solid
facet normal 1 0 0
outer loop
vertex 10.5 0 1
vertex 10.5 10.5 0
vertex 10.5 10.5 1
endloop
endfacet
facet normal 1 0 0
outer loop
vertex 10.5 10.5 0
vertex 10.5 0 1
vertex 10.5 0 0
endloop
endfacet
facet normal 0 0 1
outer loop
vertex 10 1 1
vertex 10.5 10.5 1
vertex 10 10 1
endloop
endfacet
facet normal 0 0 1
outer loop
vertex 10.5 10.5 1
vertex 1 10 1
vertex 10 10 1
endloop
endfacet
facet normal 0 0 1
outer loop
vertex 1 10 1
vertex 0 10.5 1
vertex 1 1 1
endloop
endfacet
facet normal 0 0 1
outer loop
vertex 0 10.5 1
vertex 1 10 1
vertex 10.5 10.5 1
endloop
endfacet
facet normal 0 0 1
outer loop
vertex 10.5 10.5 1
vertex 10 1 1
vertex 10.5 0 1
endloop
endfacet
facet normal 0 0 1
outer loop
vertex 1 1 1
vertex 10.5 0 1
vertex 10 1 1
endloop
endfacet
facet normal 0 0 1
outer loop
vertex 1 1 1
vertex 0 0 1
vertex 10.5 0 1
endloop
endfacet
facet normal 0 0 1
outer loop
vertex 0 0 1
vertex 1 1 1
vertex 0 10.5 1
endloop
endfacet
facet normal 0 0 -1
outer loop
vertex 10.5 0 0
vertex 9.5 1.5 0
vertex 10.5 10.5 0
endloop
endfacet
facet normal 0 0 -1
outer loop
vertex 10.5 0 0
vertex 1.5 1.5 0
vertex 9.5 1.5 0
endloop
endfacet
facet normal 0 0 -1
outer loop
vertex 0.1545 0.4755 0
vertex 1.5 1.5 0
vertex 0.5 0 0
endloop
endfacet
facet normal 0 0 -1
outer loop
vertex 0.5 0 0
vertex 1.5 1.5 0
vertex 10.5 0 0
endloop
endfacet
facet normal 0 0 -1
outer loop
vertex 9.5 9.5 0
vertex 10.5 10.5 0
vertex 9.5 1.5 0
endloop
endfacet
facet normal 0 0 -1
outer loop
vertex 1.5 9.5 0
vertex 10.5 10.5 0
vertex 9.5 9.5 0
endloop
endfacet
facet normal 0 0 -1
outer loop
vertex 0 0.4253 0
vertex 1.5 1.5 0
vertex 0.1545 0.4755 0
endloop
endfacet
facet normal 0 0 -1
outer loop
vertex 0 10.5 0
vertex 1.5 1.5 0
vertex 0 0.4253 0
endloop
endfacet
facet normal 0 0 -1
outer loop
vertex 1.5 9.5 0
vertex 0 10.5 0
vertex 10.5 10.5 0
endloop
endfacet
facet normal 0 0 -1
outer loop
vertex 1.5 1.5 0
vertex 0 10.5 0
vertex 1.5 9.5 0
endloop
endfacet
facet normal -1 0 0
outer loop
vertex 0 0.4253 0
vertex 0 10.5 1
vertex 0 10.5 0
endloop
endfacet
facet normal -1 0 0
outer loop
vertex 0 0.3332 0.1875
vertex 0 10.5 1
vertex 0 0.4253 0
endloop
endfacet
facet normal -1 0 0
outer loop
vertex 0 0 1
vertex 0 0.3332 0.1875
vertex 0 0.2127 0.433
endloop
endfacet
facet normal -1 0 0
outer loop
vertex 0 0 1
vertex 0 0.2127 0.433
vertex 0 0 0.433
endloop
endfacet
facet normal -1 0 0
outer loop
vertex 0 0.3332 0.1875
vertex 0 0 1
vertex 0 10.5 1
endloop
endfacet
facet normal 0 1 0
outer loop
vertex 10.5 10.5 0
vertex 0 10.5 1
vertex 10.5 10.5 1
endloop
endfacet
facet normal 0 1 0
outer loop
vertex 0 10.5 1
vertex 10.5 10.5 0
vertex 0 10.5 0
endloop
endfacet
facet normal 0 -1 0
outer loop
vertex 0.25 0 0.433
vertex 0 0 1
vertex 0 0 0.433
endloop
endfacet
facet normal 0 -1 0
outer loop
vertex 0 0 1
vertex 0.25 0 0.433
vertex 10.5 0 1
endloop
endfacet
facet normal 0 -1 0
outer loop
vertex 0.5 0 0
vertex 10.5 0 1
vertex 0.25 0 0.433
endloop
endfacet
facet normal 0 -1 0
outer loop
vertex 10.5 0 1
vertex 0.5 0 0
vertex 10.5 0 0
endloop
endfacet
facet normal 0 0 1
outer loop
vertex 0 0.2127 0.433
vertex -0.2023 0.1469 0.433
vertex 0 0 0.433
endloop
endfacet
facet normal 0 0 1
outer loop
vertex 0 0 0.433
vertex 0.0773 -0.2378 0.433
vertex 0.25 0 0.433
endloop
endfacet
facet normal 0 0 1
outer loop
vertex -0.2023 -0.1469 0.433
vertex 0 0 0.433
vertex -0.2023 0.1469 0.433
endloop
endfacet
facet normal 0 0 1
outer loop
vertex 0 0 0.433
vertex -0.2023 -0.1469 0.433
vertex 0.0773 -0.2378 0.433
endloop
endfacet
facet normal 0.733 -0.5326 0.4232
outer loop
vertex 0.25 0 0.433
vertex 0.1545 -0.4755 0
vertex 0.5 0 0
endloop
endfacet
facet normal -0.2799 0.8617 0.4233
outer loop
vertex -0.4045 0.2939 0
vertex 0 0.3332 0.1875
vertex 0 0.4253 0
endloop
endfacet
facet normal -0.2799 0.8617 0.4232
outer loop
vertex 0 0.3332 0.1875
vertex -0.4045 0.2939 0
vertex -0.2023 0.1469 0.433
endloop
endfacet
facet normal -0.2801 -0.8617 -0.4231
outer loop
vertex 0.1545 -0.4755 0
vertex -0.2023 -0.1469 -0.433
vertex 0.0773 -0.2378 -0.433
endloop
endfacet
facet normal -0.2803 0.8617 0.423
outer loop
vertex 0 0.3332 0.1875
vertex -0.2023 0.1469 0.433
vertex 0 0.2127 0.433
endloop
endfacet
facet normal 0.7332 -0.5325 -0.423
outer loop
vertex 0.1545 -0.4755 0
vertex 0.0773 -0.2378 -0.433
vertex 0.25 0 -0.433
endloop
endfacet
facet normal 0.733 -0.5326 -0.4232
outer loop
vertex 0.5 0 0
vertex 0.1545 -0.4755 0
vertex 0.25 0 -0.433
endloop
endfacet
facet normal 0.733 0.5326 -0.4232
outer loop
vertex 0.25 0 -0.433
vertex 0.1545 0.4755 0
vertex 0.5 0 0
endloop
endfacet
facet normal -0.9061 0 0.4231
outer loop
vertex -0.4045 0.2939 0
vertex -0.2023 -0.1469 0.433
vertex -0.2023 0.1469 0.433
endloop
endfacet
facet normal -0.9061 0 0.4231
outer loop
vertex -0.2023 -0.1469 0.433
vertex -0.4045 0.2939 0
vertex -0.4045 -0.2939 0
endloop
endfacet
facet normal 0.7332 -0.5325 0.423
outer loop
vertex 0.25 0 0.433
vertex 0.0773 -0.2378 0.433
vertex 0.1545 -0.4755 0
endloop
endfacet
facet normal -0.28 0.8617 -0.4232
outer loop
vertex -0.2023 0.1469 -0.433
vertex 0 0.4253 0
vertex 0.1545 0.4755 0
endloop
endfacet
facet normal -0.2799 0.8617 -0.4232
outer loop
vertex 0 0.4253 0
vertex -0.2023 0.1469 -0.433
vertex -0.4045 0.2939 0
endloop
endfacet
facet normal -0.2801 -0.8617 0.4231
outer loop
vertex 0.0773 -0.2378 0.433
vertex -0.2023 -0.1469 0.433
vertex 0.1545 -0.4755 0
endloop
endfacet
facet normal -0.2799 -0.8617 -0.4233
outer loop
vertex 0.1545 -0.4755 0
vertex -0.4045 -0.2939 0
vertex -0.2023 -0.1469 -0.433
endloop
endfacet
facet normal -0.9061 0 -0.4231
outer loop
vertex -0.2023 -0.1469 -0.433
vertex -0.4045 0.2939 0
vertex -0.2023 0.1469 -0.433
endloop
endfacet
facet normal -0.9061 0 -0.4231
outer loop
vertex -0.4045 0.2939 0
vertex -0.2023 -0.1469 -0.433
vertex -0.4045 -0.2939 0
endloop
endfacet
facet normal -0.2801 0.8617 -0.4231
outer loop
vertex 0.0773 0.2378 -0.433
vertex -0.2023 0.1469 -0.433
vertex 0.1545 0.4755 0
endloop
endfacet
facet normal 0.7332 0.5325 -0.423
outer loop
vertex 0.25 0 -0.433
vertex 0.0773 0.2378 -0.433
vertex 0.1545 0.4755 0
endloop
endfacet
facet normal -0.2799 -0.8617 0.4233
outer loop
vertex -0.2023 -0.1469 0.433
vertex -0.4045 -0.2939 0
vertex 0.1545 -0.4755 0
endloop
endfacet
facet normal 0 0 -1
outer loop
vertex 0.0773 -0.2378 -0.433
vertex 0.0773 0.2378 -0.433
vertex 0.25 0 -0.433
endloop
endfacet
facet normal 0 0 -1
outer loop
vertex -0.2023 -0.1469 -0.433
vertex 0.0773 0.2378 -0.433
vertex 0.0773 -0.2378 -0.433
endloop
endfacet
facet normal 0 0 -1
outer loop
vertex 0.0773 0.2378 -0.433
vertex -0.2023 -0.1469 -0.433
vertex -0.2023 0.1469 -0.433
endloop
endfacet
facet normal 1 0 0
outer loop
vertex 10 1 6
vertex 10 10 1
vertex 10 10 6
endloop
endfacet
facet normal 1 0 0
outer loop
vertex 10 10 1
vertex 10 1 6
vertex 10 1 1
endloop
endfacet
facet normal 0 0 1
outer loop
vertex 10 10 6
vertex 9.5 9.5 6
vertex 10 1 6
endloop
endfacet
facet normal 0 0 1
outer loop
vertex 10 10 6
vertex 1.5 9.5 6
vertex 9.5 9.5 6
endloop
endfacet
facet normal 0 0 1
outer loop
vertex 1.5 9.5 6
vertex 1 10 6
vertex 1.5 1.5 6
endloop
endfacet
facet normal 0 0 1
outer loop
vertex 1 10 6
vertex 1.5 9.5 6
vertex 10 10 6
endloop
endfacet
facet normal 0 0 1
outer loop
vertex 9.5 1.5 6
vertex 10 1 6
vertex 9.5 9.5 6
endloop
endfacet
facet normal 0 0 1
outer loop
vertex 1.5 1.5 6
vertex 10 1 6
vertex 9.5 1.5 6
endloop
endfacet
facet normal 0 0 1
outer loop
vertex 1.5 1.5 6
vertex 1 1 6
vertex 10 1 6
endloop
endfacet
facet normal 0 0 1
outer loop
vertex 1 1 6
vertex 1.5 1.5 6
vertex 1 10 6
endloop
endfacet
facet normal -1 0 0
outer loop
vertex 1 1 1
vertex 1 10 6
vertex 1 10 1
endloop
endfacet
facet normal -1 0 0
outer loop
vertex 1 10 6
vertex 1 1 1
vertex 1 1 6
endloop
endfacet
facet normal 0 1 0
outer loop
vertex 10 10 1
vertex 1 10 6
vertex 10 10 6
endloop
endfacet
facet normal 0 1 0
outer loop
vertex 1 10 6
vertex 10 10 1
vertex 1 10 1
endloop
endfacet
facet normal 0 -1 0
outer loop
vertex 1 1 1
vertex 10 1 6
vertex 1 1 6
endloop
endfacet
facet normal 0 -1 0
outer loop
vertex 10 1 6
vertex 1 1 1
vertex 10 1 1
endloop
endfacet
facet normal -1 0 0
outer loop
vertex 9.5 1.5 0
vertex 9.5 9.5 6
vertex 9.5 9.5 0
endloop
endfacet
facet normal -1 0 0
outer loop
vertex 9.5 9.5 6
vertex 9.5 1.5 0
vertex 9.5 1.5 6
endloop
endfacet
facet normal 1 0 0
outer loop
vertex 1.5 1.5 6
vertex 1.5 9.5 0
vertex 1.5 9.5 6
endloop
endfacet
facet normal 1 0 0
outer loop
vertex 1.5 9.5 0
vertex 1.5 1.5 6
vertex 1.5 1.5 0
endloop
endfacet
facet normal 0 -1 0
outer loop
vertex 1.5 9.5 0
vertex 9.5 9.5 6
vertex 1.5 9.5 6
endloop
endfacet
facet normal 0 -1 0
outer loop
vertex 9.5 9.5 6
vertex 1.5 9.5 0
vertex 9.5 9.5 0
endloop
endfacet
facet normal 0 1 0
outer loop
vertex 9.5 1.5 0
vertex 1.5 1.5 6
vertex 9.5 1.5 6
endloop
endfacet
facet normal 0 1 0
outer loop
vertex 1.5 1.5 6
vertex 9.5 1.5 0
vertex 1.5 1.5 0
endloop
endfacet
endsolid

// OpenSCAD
// file: multiprint.scad
//----------------------------------------------------------------------
// multiprint.scad -- make it easy to print one or several of an item
//
// For your reference, it seems the Makerbot 2 bed
// has dimensions:  width = 285, depth = 153.
//
// example:
//
//     several(4,4,5)
//         cube([2,3,3]);
//----------------------------------------------------------------------

module several(a,b,itemwd,itemht) {
    // the odd math makes a single item line up with the x and y axes
    translate([-((a-1)*itemwd)/2,-((b-1)*itemht)/2,0]) {
        for (a0=[0:a-1]) {
            for (b0=[0:b-1]) {
                translate([a0*itemwd,b0*itemht,0])
                    child();
            }
        }
    }
}

//----------------------------------------------------------------------
// row -- print several items in a row
//
// example:  row(10) { sphere(1); sphere(5); sphere(10); }
//----------------------------------------------------------------------
module row(wid) {
  for (i = [0 : $children-1]) 
    translate([i*wid,0,0])
      child(i);
}
// main file
//----------------------------------------------------------------------
// endpiece.scad -- piece for the end of each arm
//
// The main purpose of this piece is to prevent chafing of the
// motor wires against the relatively sharp edges of the fiberglass
// arm.  A future version might incorporate a protrusion to protect
// the exposed motor wires at the end of the arm.
//----------------------------------------------------------------------

D1 = 8;
D2 = 9;
D3 = 11;

Len=5;
Overhang=1;

module item() {

    difference() {
        union() {
            translate([0,0,0]) {
               cube([D3-.5,D3-.5,Overhang]);
               sphere(.5);
            }
            translate([(D3-D2)/2,(D3-D2)/2,0])
                cube([D2,D2,Len+Overhang]);
        }
        translate([(D3-D1)/2,(D3-D1)/2,-1])
            cube([D1,D1,Len+Overhang+2]);
    }

//  difference() {
 //     cube([D2,D2,Len+Overhang]);
  //    translate([(D2-D1)/2,(D2-D1)/2,-1])
   //       cube([D1,D1,Len+Overhang+2]);
 // }

}

include <multiprint.scad>
several(1,1,15,15) item();
